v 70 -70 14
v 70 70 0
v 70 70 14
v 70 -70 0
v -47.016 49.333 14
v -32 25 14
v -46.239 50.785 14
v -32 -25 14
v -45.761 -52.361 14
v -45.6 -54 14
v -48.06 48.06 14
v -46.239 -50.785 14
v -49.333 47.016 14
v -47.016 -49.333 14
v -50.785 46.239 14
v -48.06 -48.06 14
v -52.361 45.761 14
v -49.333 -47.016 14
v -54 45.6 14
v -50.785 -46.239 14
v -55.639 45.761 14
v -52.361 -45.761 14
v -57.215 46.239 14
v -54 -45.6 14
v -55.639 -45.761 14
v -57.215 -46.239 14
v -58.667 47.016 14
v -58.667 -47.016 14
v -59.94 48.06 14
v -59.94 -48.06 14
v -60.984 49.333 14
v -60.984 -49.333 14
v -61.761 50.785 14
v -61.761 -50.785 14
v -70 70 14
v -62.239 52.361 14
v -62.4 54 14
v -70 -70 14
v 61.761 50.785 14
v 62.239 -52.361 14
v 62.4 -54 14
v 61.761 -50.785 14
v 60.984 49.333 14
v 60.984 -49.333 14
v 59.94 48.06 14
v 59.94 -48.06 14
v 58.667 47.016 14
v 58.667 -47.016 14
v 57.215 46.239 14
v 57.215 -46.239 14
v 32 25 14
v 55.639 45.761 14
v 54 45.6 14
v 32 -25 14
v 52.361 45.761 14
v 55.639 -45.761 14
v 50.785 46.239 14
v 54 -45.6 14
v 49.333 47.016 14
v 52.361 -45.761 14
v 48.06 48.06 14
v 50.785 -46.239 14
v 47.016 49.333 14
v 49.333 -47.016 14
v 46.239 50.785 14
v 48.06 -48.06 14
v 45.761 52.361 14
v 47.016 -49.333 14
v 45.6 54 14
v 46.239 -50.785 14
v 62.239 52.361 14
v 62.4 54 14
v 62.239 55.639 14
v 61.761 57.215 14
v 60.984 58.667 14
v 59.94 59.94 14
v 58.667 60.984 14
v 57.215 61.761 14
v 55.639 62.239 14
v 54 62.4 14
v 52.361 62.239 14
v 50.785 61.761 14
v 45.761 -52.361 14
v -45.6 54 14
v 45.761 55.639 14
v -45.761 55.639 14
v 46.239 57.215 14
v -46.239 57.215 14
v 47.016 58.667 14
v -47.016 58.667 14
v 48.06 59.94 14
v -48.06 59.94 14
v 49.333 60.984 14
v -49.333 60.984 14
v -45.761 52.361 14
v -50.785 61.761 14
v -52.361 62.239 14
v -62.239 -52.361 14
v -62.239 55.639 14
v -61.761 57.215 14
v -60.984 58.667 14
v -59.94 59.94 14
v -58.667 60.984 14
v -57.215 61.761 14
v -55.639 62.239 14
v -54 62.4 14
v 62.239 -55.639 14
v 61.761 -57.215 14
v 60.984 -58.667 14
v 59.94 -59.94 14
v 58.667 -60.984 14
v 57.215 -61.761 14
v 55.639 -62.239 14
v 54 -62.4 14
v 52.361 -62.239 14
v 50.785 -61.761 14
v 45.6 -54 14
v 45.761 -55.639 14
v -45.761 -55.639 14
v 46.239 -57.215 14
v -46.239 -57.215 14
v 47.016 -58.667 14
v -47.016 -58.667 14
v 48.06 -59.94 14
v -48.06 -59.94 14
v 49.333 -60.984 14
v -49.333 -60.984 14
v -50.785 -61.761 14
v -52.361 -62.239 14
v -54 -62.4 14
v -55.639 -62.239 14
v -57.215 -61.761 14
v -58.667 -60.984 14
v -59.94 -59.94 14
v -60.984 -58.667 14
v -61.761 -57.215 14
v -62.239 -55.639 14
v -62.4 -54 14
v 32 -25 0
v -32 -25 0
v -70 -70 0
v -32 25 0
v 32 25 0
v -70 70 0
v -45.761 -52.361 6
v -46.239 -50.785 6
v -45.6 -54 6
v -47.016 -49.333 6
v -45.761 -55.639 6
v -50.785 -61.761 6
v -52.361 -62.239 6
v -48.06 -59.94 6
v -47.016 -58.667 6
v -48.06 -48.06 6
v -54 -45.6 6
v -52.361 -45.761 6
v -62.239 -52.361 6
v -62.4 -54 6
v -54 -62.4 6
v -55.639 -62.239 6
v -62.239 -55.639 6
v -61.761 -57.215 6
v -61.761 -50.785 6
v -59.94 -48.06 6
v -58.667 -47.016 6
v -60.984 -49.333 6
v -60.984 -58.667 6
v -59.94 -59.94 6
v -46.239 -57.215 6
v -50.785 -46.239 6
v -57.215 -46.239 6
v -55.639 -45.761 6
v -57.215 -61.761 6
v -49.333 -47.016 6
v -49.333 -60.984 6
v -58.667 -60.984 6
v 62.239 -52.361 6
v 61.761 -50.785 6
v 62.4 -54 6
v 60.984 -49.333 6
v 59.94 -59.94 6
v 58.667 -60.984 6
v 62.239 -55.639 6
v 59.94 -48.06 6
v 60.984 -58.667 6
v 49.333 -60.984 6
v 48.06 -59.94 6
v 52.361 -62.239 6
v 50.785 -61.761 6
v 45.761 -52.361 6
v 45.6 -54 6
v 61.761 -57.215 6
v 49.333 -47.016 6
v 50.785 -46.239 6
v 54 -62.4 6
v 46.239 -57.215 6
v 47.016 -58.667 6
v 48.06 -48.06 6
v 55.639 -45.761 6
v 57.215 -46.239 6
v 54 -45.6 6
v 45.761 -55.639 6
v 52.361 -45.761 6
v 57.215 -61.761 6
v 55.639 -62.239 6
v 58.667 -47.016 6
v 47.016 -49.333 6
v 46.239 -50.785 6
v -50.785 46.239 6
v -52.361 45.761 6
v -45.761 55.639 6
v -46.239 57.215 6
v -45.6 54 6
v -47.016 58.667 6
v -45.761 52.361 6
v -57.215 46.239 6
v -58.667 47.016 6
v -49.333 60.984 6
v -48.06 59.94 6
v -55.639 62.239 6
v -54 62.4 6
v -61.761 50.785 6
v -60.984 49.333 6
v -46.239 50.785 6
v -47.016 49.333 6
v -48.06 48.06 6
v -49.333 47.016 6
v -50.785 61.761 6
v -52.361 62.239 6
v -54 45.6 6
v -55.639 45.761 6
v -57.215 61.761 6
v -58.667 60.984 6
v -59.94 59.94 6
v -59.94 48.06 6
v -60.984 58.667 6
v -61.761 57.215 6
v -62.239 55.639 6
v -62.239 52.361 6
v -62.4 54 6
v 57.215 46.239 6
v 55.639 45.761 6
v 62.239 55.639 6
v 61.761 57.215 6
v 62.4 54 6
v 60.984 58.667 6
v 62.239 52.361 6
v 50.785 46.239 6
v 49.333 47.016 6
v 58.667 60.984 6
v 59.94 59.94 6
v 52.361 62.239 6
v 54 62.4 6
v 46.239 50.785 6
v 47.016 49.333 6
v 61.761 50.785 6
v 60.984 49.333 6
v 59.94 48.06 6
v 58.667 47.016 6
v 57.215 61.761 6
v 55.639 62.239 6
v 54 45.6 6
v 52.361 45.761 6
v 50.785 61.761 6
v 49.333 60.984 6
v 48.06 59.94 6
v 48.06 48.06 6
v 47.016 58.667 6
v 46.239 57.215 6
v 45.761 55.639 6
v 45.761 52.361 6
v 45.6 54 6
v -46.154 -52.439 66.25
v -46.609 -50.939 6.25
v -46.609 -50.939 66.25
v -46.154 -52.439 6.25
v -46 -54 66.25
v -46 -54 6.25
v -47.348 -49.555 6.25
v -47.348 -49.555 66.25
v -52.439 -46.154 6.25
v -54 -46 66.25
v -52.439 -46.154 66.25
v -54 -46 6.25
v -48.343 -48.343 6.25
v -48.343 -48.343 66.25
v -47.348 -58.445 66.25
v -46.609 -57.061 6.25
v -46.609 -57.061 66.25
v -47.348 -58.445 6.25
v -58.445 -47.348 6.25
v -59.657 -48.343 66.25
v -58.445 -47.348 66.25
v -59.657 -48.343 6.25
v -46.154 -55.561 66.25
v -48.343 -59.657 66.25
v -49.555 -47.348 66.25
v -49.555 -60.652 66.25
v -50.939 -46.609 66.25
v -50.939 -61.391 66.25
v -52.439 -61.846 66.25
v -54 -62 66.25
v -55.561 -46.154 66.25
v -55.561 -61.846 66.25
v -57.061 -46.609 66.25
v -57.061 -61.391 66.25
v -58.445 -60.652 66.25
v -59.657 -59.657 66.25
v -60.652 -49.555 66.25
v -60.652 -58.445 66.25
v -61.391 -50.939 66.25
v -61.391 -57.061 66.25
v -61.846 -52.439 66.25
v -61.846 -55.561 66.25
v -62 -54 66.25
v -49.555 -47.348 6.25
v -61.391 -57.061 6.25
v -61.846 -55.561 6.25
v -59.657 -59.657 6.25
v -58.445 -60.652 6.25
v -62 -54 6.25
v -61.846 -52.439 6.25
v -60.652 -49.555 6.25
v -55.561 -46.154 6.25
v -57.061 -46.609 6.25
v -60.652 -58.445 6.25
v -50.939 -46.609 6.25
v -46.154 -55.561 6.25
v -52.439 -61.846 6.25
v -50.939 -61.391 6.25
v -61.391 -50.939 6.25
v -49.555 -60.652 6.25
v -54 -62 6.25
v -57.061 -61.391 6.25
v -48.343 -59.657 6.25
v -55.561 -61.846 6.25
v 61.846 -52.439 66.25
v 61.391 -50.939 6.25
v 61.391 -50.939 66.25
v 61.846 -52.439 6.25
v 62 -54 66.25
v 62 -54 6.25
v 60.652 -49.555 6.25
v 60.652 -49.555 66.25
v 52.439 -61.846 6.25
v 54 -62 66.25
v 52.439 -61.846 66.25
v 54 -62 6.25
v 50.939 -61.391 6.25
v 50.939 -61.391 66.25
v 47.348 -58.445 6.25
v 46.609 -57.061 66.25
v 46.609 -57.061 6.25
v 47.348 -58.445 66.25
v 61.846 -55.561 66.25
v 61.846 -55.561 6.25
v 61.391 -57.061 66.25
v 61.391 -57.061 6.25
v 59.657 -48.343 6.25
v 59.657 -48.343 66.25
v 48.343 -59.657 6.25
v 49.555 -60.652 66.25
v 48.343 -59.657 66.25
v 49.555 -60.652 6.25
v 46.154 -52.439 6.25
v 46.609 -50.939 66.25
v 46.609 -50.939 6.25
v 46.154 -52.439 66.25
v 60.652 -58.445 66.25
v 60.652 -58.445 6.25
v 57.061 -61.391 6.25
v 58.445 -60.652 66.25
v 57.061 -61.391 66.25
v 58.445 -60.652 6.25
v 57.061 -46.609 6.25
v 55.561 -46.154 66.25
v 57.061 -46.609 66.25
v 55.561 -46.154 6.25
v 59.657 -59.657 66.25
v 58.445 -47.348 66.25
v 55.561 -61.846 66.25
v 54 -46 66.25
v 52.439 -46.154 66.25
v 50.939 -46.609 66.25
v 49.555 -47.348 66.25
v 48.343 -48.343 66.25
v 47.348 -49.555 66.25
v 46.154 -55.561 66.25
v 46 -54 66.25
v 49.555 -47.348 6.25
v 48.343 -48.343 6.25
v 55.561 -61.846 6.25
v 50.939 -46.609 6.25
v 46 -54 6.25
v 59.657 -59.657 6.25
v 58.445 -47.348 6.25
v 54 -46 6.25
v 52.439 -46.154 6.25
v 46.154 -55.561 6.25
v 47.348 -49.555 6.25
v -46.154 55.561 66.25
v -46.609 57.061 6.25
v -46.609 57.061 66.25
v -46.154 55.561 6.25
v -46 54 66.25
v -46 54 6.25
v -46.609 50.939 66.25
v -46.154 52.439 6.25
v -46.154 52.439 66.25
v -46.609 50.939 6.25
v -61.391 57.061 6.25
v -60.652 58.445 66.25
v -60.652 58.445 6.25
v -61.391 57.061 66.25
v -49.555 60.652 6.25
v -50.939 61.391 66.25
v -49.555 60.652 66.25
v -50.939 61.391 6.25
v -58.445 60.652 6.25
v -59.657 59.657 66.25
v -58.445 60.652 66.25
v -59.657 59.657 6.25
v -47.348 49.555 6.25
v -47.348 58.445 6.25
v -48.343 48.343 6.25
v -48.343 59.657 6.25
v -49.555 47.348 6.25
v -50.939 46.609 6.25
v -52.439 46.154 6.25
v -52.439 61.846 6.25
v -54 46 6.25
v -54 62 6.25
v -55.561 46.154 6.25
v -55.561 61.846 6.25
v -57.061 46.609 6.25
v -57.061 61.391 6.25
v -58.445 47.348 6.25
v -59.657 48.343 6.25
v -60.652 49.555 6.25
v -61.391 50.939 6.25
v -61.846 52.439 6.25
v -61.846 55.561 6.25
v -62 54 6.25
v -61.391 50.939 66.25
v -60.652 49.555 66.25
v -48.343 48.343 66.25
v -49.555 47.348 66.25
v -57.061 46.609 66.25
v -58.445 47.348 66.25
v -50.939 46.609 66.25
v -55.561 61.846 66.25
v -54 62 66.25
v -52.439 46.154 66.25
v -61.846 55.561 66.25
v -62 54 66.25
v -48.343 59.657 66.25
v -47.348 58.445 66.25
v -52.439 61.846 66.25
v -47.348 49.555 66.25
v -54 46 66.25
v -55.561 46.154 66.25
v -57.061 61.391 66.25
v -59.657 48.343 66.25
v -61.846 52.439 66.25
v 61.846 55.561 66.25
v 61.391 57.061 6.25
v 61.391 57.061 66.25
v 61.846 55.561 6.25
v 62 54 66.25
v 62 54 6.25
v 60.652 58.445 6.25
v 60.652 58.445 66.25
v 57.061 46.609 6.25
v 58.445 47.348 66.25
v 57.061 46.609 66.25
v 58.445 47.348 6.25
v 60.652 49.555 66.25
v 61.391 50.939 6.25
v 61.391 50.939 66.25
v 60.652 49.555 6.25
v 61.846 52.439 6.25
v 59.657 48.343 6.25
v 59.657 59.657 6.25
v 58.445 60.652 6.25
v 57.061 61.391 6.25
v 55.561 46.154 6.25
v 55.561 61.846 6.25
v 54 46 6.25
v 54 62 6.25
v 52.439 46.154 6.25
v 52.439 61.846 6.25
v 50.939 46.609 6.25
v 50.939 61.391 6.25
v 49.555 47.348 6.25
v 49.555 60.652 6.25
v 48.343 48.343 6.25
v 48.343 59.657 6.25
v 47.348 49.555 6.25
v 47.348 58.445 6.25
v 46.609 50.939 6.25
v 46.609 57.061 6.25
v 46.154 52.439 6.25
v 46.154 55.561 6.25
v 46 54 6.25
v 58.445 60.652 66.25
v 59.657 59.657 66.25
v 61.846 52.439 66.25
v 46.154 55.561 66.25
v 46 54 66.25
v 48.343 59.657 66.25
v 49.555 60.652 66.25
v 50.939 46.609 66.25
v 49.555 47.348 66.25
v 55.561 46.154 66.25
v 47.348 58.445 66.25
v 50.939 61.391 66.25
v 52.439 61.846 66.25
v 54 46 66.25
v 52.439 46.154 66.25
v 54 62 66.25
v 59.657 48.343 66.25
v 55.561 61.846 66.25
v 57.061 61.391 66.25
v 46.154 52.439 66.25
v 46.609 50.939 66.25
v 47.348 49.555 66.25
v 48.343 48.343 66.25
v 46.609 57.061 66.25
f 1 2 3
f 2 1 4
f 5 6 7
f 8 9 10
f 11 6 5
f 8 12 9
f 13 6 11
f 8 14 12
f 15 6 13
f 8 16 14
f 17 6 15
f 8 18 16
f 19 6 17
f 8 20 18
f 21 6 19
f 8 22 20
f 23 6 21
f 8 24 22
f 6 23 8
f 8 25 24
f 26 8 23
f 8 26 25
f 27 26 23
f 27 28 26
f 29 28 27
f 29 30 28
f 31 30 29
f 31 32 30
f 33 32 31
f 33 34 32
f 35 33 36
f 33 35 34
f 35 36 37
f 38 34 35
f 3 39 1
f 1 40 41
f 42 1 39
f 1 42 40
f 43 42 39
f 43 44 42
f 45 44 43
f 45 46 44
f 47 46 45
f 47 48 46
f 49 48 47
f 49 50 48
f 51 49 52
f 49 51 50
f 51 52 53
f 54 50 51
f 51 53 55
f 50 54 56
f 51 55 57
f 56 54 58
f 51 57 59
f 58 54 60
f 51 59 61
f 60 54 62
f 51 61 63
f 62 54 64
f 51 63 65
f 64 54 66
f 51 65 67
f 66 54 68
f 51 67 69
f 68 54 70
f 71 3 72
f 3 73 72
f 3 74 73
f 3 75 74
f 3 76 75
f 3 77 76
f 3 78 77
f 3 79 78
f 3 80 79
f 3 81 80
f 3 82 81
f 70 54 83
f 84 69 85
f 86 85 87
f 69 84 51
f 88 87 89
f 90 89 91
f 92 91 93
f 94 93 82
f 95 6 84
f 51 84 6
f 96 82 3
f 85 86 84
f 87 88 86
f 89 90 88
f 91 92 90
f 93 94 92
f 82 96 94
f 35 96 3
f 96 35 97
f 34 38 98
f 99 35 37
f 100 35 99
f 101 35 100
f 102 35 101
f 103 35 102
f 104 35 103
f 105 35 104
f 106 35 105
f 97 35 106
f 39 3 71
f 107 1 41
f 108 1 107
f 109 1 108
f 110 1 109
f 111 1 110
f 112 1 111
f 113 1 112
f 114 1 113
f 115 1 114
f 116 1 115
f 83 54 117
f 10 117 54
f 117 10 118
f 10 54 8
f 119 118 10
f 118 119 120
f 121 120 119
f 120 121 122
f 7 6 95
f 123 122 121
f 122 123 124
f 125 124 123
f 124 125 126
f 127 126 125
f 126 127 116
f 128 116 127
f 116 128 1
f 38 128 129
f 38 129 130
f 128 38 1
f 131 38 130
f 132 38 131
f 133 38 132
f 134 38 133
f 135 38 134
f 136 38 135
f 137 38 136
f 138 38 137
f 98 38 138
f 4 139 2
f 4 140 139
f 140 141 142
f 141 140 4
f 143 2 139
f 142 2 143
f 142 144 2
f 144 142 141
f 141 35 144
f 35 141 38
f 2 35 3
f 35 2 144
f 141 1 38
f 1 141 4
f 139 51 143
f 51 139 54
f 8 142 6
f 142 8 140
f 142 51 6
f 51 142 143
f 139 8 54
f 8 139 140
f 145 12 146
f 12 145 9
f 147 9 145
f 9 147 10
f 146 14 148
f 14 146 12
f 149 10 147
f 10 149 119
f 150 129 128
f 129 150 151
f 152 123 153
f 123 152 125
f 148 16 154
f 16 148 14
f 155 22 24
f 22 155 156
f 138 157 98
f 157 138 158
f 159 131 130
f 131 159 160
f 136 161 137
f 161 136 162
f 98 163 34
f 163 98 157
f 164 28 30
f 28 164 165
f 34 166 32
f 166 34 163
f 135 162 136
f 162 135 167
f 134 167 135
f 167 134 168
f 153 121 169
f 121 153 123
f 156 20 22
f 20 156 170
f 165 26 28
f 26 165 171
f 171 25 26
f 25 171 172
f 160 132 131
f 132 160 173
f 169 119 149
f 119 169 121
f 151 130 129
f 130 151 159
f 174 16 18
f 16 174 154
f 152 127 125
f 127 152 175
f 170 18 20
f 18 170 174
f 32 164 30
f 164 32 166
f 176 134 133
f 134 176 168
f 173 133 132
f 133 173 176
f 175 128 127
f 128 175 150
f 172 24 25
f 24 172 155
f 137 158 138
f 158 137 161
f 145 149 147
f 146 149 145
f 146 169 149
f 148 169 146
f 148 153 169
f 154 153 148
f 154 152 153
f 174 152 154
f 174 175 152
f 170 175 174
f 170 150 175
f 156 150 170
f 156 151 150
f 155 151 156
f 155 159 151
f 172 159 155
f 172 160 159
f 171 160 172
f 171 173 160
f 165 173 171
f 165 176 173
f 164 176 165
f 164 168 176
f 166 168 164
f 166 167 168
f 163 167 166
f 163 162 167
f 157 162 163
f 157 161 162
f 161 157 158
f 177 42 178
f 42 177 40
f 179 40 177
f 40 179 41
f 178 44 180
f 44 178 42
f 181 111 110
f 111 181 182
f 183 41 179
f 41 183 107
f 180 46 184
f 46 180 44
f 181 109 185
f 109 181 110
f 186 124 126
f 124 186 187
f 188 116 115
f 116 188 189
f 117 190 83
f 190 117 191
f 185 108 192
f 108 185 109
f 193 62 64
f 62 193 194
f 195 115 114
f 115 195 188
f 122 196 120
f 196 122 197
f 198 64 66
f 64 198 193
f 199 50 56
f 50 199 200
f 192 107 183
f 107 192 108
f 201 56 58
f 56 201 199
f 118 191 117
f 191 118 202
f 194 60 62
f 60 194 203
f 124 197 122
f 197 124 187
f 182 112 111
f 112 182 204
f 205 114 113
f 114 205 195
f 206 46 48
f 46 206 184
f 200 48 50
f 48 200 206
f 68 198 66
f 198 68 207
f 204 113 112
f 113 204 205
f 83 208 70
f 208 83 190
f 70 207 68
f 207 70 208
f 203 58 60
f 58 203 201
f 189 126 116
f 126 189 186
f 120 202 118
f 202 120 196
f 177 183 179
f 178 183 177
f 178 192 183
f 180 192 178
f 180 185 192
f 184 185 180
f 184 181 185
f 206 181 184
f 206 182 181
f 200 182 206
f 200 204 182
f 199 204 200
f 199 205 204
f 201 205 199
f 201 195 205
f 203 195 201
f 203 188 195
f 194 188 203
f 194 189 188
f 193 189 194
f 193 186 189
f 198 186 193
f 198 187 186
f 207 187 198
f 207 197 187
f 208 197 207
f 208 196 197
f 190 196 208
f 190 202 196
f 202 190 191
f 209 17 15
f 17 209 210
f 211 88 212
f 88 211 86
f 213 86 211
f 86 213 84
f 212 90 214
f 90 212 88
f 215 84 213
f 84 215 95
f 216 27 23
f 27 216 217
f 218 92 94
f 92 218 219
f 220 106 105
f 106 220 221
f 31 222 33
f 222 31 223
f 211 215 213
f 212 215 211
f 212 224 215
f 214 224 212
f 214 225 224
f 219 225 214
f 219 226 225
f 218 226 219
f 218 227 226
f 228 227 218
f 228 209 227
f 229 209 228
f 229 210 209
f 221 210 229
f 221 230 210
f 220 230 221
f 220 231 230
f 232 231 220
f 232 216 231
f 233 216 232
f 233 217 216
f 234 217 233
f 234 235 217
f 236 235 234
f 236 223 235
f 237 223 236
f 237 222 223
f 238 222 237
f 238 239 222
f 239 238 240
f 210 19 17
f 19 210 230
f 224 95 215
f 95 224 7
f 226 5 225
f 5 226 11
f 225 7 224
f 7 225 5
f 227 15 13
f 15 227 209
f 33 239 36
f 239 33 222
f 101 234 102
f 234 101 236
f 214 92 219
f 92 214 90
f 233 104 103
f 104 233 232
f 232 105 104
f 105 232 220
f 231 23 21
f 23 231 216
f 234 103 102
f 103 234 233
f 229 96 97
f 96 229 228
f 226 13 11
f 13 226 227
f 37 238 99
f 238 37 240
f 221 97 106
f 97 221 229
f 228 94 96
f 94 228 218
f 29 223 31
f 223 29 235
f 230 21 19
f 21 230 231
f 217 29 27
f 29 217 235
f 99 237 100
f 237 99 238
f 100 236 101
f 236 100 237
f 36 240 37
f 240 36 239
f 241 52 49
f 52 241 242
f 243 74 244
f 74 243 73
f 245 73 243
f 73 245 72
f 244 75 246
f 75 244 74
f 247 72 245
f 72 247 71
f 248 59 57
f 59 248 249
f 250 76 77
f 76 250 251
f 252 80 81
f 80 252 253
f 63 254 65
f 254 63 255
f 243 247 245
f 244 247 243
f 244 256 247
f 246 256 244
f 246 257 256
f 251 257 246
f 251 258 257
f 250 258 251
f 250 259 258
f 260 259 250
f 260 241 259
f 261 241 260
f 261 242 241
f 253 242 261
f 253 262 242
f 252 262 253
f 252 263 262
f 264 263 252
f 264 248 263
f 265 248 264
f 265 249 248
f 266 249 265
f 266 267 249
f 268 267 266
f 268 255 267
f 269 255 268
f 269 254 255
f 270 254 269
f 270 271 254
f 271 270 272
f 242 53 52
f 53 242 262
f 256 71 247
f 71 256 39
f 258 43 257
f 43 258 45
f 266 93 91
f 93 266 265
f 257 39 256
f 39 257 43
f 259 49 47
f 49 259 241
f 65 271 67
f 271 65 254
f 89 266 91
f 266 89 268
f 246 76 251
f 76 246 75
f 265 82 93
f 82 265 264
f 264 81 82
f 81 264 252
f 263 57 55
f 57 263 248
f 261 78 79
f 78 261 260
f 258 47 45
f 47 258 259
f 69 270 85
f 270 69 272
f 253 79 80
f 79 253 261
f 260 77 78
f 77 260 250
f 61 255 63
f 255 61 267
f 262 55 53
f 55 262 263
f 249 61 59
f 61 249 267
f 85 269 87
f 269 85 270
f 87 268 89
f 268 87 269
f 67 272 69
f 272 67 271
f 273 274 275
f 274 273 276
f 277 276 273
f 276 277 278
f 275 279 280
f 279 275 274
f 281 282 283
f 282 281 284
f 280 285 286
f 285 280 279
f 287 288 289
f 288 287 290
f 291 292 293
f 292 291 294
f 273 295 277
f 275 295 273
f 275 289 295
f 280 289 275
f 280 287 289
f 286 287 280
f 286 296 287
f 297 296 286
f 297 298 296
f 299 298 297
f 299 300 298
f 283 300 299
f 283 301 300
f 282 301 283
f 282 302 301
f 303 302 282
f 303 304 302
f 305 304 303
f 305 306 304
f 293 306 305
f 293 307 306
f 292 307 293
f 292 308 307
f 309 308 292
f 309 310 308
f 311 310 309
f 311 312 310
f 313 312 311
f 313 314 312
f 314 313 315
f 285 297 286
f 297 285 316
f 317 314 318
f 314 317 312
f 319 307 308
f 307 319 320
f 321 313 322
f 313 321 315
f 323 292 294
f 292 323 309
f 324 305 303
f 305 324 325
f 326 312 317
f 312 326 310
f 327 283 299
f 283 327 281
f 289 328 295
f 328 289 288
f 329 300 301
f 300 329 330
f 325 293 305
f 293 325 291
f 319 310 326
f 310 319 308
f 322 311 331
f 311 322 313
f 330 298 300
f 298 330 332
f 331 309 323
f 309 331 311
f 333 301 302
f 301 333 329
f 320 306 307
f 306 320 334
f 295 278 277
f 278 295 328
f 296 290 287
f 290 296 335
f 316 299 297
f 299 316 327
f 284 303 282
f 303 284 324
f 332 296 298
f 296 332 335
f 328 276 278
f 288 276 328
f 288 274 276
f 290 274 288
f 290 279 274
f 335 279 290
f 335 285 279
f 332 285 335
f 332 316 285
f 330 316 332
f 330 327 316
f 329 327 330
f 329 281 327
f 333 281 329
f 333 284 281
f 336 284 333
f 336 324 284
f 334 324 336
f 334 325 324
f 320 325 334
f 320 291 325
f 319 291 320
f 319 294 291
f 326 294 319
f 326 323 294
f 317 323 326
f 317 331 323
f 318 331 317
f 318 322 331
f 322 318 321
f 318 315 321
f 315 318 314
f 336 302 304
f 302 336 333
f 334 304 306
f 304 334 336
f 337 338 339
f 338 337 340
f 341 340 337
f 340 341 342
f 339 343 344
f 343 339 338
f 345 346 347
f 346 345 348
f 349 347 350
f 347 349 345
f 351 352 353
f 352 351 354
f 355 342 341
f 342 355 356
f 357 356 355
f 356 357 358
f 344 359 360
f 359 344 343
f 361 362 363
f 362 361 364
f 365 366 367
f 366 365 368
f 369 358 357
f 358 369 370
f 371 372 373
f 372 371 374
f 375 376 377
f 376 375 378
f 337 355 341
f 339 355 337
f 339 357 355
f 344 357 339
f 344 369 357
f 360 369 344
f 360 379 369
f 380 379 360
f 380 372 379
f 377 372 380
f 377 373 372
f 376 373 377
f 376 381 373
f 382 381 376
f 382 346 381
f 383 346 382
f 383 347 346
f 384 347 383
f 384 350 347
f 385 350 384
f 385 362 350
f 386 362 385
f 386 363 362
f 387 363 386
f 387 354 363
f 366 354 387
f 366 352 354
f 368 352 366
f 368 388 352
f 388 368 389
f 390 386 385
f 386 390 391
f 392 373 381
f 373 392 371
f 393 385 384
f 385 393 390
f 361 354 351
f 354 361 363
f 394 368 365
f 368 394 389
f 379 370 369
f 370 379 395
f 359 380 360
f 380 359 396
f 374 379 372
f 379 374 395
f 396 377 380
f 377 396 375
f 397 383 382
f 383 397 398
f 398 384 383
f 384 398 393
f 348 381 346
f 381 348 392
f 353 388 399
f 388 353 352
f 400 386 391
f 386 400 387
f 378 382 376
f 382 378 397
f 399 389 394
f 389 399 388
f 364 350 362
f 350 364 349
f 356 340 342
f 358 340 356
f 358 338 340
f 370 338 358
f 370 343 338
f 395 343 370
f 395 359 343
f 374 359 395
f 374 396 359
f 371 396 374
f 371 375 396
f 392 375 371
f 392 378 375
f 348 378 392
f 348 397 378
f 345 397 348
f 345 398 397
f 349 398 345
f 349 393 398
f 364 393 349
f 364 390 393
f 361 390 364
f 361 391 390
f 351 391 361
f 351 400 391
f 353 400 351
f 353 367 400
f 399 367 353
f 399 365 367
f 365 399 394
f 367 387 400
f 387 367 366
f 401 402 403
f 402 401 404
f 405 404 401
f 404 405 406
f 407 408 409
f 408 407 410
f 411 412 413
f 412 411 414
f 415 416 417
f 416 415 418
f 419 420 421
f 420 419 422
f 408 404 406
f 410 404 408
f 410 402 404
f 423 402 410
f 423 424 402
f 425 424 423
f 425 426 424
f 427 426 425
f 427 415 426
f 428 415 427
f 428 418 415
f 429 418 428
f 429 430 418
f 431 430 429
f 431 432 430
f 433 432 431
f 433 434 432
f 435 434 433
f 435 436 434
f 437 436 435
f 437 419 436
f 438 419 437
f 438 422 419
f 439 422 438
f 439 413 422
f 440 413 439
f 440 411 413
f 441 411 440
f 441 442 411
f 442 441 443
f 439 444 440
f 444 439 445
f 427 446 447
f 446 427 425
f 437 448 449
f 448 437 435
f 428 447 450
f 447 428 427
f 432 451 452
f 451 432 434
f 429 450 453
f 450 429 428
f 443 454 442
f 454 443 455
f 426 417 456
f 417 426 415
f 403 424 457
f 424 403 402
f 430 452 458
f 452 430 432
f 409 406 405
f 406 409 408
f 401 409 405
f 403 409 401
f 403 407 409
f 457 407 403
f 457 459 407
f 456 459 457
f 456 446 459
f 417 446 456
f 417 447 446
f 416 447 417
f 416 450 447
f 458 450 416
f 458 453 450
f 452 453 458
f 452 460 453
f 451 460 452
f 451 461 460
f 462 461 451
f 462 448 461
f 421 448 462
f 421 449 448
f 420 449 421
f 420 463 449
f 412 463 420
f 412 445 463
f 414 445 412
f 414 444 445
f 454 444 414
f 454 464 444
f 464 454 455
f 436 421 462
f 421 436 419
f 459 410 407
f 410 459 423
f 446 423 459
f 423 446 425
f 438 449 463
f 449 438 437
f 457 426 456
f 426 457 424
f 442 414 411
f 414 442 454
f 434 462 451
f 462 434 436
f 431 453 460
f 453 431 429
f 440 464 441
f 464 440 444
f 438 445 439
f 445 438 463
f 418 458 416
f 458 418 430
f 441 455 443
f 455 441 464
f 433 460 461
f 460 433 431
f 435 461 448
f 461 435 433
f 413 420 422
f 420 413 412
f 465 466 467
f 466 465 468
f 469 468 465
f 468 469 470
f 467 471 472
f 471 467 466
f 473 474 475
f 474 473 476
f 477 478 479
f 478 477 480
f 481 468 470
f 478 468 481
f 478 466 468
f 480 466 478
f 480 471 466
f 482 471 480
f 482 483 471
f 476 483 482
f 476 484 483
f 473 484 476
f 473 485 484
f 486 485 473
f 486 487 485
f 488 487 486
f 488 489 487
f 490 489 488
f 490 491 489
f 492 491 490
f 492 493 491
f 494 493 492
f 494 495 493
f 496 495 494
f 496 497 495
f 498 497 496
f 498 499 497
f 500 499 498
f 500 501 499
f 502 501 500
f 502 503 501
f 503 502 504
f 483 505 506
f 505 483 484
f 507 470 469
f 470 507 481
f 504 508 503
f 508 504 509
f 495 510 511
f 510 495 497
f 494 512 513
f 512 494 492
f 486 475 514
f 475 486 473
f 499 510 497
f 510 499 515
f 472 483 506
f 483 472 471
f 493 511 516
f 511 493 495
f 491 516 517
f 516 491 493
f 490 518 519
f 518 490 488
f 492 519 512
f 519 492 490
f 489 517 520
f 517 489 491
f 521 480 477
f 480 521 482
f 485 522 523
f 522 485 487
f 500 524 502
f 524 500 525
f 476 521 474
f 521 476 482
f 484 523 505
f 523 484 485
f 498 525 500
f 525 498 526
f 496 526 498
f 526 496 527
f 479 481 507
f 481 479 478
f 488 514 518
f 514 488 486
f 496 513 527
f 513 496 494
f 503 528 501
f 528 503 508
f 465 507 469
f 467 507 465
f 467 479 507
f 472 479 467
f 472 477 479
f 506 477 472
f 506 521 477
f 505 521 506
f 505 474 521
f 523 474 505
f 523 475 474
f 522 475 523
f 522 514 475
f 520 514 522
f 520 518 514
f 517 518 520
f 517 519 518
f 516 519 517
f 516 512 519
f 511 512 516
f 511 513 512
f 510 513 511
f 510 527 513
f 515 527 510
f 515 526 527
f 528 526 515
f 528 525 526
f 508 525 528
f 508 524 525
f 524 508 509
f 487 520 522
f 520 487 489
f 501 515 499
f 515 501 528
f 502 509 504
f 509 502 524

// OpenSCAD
$fn = 32;

// ------------------------------------------------------------------------
// Frame with four posts: 140 x 140 mm frame, four d16 posts
// Every part is its own module, assembly() places them once.
// ------------------------------------------------------------------------

// --- part 1 ---
module base_frame() {
  difference() {
    translate([-70, -70, 0]) cube([140, 140, 14]);
    translate([-32, -25, -1]) cube([64, 50, 16]);
    translate([-54, -54, 6]) cylinder(h = 9, d = 16.8);
    translate([54, -54, 6]) cylinder(h = 9, d = 16.8);
    translate([-54, 54, 6]) cylinder(h = 9, d = 16.8);
    translate([54, 54, 6]) cylinder(h = 9, d = 16.8);
  }
}

// --- part 2 ---
module post1() {
  cylinder(h = 60, d = 16);
}

// --- part 3 ---
module post2() {
  cylinder(h = 60, d = 16);
}

// --- part 4 ---
module post3() {
  cylinder(h = 60, d = 16);
}

// --- part 5 ---
module post4() {
  cylinder(h = 60, d = 16);
}

// --- assembly ---
module assembly() {
  translate([0, 0, 0]) rotate([0, 0, 0]) base_frame();
  translate([-54, -54, 6.25]) rotate([0, 0, 0]) post1();
  translate([54, -54, 6.25]) rotate([0, 0, 0]) post2();
  translate([-54, 54, 6.25]) rotate([0, 0, 0]) post3();
  translate([54, 54, 6.25]) rotate([0, 0, 0]) post4();
}

assembly();
